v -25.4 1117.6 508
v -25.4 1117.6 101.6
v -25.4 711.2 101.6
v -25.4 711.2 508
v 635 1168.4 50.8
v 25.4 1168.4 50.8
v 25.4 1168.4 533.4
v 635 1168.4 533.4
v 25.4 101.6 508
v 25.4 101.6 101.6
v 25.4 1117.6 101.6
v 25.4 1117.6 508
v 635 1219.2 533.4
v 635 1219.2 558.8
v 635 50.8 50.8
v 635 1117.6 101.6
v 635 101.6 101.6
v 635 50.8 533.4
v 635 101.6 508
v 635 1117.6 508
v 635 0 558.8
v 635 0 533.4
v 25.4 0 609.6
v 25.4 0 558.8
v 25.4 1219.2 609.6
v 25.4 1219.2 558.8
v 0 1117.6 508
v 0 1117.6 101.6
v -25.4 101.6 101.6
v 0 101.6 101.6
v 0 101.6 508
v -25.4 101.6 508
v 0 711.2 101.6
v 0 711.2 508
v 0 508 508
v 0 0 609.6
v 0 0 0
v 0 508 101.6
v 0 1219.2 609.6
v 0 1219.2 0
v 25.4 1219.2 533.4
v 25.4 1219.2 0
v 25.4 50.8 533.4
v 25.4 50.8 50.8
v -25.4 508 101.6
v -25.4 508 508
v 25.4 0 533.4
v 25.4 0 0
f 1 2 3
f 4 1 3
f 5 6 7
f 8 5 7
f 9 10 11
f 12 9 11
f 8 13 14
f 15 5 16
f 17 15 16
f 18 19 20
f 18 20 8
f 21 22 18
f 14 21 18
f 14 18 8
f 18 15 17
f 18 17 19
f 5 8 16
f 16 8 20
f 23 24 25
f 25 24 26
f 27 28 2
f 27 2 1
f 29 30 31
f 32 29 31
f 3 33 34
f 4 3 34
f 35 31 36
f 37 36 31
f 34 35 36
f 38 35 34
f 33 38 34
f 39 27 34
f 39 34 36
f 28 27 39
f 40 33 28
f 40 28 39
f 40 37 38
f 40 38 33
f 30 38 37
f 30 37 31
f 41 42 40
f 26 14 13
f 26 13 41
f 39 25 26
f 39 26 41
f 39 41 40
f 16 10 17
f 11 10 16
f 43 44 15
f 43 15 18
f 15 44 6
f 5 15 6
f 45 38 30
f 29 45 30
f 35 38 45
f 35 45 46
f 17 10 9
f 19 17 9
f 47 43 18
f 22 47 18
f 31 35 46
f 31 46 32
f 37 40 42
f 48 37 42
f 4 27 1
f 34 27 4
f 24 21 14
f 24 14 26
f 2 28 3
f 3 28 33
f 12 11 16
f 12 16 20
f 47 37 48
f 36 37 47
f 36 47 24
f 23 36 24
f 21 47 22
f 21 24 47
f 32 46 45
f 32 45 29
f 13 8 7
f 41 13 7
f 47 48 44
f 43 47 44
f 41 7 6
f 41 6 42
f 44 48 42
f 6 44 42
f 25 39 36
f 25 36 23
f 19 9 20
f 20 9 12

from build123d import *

# Parameters (mm, degrees)
F0_W     = 25.4
F0_H     = 1219.2
F1_DEPTH = 609.6
F2_W     = 1117.6
F2_H     = 508
F2_W_2   = 1016
F2_H_2   = 406.4
F3_DEPTH = 609.6
F4_W     = 406.4
F4_H     = 406.4
F5_DEPTH = 25.4
F6_W     = 609.6
F6_H     = 25.4
F7_DEPTH = 50.8
F8_W     = 609.6
F8_H     = 25.4
F9_DEPTH = 50.8


with BuildPart() as f1:
    # F0 (on Top) → F1 (new body)
    with BuildSketch(Plane.XY):
        with Locations((12.7, 609.6)):
            Rectangle(F0_W, F0_H)
    extrude(amount=F1_DEPTH)

    # F2 (on face) → F3 (join)
    with BuildSketch(Plane.YZ.offset(25.4)):
        with Locations((609.6, 304.8)):
            Rectangle(F2_W, F2_H)
        with Locations((609.6, 304.8)):
            Rectangle(F2_W_2, F2_H_2, mode=Mode.SUBTRACT)
    extrude(amount=F3_DEPTH)

    # F4 (on face) → F5 (join)
    with BuildSketch(Plane(origin=(0, 0, 0), x_dir=(0, -1, 0), z_dir=(-1, 0, 0))):
        with Locations((-914.4, 304.8)):
            Rectangle(F4_W, F4_H)
        with Locations((-304.8, 304.8)):
            Rectangle(F4_W, F4_H)
    extrude(amount=F5_DEPTH)

    # F6 (on face) → F7 (join)
    with BuildSketch(Plane.XZ.offset(-50.8)):
        with Locations((330.2, 546.1)):
            Rectangle(F6_W, F6_H)
    extrude(amount=F7_DEPTH)

    # F8 (on face) → F9 (join)
    with BuildSketch(Plane(origin=(0, 1168.4, 0), x_dir=(-1, 0, 0), z_dir=(0, 1, 0))):
        with Locations((-330.2, 546.1)):
            Rectangle(F8_W, F8_H)
    extrude(amount=F9_DEPTH)


solid = f1.part
